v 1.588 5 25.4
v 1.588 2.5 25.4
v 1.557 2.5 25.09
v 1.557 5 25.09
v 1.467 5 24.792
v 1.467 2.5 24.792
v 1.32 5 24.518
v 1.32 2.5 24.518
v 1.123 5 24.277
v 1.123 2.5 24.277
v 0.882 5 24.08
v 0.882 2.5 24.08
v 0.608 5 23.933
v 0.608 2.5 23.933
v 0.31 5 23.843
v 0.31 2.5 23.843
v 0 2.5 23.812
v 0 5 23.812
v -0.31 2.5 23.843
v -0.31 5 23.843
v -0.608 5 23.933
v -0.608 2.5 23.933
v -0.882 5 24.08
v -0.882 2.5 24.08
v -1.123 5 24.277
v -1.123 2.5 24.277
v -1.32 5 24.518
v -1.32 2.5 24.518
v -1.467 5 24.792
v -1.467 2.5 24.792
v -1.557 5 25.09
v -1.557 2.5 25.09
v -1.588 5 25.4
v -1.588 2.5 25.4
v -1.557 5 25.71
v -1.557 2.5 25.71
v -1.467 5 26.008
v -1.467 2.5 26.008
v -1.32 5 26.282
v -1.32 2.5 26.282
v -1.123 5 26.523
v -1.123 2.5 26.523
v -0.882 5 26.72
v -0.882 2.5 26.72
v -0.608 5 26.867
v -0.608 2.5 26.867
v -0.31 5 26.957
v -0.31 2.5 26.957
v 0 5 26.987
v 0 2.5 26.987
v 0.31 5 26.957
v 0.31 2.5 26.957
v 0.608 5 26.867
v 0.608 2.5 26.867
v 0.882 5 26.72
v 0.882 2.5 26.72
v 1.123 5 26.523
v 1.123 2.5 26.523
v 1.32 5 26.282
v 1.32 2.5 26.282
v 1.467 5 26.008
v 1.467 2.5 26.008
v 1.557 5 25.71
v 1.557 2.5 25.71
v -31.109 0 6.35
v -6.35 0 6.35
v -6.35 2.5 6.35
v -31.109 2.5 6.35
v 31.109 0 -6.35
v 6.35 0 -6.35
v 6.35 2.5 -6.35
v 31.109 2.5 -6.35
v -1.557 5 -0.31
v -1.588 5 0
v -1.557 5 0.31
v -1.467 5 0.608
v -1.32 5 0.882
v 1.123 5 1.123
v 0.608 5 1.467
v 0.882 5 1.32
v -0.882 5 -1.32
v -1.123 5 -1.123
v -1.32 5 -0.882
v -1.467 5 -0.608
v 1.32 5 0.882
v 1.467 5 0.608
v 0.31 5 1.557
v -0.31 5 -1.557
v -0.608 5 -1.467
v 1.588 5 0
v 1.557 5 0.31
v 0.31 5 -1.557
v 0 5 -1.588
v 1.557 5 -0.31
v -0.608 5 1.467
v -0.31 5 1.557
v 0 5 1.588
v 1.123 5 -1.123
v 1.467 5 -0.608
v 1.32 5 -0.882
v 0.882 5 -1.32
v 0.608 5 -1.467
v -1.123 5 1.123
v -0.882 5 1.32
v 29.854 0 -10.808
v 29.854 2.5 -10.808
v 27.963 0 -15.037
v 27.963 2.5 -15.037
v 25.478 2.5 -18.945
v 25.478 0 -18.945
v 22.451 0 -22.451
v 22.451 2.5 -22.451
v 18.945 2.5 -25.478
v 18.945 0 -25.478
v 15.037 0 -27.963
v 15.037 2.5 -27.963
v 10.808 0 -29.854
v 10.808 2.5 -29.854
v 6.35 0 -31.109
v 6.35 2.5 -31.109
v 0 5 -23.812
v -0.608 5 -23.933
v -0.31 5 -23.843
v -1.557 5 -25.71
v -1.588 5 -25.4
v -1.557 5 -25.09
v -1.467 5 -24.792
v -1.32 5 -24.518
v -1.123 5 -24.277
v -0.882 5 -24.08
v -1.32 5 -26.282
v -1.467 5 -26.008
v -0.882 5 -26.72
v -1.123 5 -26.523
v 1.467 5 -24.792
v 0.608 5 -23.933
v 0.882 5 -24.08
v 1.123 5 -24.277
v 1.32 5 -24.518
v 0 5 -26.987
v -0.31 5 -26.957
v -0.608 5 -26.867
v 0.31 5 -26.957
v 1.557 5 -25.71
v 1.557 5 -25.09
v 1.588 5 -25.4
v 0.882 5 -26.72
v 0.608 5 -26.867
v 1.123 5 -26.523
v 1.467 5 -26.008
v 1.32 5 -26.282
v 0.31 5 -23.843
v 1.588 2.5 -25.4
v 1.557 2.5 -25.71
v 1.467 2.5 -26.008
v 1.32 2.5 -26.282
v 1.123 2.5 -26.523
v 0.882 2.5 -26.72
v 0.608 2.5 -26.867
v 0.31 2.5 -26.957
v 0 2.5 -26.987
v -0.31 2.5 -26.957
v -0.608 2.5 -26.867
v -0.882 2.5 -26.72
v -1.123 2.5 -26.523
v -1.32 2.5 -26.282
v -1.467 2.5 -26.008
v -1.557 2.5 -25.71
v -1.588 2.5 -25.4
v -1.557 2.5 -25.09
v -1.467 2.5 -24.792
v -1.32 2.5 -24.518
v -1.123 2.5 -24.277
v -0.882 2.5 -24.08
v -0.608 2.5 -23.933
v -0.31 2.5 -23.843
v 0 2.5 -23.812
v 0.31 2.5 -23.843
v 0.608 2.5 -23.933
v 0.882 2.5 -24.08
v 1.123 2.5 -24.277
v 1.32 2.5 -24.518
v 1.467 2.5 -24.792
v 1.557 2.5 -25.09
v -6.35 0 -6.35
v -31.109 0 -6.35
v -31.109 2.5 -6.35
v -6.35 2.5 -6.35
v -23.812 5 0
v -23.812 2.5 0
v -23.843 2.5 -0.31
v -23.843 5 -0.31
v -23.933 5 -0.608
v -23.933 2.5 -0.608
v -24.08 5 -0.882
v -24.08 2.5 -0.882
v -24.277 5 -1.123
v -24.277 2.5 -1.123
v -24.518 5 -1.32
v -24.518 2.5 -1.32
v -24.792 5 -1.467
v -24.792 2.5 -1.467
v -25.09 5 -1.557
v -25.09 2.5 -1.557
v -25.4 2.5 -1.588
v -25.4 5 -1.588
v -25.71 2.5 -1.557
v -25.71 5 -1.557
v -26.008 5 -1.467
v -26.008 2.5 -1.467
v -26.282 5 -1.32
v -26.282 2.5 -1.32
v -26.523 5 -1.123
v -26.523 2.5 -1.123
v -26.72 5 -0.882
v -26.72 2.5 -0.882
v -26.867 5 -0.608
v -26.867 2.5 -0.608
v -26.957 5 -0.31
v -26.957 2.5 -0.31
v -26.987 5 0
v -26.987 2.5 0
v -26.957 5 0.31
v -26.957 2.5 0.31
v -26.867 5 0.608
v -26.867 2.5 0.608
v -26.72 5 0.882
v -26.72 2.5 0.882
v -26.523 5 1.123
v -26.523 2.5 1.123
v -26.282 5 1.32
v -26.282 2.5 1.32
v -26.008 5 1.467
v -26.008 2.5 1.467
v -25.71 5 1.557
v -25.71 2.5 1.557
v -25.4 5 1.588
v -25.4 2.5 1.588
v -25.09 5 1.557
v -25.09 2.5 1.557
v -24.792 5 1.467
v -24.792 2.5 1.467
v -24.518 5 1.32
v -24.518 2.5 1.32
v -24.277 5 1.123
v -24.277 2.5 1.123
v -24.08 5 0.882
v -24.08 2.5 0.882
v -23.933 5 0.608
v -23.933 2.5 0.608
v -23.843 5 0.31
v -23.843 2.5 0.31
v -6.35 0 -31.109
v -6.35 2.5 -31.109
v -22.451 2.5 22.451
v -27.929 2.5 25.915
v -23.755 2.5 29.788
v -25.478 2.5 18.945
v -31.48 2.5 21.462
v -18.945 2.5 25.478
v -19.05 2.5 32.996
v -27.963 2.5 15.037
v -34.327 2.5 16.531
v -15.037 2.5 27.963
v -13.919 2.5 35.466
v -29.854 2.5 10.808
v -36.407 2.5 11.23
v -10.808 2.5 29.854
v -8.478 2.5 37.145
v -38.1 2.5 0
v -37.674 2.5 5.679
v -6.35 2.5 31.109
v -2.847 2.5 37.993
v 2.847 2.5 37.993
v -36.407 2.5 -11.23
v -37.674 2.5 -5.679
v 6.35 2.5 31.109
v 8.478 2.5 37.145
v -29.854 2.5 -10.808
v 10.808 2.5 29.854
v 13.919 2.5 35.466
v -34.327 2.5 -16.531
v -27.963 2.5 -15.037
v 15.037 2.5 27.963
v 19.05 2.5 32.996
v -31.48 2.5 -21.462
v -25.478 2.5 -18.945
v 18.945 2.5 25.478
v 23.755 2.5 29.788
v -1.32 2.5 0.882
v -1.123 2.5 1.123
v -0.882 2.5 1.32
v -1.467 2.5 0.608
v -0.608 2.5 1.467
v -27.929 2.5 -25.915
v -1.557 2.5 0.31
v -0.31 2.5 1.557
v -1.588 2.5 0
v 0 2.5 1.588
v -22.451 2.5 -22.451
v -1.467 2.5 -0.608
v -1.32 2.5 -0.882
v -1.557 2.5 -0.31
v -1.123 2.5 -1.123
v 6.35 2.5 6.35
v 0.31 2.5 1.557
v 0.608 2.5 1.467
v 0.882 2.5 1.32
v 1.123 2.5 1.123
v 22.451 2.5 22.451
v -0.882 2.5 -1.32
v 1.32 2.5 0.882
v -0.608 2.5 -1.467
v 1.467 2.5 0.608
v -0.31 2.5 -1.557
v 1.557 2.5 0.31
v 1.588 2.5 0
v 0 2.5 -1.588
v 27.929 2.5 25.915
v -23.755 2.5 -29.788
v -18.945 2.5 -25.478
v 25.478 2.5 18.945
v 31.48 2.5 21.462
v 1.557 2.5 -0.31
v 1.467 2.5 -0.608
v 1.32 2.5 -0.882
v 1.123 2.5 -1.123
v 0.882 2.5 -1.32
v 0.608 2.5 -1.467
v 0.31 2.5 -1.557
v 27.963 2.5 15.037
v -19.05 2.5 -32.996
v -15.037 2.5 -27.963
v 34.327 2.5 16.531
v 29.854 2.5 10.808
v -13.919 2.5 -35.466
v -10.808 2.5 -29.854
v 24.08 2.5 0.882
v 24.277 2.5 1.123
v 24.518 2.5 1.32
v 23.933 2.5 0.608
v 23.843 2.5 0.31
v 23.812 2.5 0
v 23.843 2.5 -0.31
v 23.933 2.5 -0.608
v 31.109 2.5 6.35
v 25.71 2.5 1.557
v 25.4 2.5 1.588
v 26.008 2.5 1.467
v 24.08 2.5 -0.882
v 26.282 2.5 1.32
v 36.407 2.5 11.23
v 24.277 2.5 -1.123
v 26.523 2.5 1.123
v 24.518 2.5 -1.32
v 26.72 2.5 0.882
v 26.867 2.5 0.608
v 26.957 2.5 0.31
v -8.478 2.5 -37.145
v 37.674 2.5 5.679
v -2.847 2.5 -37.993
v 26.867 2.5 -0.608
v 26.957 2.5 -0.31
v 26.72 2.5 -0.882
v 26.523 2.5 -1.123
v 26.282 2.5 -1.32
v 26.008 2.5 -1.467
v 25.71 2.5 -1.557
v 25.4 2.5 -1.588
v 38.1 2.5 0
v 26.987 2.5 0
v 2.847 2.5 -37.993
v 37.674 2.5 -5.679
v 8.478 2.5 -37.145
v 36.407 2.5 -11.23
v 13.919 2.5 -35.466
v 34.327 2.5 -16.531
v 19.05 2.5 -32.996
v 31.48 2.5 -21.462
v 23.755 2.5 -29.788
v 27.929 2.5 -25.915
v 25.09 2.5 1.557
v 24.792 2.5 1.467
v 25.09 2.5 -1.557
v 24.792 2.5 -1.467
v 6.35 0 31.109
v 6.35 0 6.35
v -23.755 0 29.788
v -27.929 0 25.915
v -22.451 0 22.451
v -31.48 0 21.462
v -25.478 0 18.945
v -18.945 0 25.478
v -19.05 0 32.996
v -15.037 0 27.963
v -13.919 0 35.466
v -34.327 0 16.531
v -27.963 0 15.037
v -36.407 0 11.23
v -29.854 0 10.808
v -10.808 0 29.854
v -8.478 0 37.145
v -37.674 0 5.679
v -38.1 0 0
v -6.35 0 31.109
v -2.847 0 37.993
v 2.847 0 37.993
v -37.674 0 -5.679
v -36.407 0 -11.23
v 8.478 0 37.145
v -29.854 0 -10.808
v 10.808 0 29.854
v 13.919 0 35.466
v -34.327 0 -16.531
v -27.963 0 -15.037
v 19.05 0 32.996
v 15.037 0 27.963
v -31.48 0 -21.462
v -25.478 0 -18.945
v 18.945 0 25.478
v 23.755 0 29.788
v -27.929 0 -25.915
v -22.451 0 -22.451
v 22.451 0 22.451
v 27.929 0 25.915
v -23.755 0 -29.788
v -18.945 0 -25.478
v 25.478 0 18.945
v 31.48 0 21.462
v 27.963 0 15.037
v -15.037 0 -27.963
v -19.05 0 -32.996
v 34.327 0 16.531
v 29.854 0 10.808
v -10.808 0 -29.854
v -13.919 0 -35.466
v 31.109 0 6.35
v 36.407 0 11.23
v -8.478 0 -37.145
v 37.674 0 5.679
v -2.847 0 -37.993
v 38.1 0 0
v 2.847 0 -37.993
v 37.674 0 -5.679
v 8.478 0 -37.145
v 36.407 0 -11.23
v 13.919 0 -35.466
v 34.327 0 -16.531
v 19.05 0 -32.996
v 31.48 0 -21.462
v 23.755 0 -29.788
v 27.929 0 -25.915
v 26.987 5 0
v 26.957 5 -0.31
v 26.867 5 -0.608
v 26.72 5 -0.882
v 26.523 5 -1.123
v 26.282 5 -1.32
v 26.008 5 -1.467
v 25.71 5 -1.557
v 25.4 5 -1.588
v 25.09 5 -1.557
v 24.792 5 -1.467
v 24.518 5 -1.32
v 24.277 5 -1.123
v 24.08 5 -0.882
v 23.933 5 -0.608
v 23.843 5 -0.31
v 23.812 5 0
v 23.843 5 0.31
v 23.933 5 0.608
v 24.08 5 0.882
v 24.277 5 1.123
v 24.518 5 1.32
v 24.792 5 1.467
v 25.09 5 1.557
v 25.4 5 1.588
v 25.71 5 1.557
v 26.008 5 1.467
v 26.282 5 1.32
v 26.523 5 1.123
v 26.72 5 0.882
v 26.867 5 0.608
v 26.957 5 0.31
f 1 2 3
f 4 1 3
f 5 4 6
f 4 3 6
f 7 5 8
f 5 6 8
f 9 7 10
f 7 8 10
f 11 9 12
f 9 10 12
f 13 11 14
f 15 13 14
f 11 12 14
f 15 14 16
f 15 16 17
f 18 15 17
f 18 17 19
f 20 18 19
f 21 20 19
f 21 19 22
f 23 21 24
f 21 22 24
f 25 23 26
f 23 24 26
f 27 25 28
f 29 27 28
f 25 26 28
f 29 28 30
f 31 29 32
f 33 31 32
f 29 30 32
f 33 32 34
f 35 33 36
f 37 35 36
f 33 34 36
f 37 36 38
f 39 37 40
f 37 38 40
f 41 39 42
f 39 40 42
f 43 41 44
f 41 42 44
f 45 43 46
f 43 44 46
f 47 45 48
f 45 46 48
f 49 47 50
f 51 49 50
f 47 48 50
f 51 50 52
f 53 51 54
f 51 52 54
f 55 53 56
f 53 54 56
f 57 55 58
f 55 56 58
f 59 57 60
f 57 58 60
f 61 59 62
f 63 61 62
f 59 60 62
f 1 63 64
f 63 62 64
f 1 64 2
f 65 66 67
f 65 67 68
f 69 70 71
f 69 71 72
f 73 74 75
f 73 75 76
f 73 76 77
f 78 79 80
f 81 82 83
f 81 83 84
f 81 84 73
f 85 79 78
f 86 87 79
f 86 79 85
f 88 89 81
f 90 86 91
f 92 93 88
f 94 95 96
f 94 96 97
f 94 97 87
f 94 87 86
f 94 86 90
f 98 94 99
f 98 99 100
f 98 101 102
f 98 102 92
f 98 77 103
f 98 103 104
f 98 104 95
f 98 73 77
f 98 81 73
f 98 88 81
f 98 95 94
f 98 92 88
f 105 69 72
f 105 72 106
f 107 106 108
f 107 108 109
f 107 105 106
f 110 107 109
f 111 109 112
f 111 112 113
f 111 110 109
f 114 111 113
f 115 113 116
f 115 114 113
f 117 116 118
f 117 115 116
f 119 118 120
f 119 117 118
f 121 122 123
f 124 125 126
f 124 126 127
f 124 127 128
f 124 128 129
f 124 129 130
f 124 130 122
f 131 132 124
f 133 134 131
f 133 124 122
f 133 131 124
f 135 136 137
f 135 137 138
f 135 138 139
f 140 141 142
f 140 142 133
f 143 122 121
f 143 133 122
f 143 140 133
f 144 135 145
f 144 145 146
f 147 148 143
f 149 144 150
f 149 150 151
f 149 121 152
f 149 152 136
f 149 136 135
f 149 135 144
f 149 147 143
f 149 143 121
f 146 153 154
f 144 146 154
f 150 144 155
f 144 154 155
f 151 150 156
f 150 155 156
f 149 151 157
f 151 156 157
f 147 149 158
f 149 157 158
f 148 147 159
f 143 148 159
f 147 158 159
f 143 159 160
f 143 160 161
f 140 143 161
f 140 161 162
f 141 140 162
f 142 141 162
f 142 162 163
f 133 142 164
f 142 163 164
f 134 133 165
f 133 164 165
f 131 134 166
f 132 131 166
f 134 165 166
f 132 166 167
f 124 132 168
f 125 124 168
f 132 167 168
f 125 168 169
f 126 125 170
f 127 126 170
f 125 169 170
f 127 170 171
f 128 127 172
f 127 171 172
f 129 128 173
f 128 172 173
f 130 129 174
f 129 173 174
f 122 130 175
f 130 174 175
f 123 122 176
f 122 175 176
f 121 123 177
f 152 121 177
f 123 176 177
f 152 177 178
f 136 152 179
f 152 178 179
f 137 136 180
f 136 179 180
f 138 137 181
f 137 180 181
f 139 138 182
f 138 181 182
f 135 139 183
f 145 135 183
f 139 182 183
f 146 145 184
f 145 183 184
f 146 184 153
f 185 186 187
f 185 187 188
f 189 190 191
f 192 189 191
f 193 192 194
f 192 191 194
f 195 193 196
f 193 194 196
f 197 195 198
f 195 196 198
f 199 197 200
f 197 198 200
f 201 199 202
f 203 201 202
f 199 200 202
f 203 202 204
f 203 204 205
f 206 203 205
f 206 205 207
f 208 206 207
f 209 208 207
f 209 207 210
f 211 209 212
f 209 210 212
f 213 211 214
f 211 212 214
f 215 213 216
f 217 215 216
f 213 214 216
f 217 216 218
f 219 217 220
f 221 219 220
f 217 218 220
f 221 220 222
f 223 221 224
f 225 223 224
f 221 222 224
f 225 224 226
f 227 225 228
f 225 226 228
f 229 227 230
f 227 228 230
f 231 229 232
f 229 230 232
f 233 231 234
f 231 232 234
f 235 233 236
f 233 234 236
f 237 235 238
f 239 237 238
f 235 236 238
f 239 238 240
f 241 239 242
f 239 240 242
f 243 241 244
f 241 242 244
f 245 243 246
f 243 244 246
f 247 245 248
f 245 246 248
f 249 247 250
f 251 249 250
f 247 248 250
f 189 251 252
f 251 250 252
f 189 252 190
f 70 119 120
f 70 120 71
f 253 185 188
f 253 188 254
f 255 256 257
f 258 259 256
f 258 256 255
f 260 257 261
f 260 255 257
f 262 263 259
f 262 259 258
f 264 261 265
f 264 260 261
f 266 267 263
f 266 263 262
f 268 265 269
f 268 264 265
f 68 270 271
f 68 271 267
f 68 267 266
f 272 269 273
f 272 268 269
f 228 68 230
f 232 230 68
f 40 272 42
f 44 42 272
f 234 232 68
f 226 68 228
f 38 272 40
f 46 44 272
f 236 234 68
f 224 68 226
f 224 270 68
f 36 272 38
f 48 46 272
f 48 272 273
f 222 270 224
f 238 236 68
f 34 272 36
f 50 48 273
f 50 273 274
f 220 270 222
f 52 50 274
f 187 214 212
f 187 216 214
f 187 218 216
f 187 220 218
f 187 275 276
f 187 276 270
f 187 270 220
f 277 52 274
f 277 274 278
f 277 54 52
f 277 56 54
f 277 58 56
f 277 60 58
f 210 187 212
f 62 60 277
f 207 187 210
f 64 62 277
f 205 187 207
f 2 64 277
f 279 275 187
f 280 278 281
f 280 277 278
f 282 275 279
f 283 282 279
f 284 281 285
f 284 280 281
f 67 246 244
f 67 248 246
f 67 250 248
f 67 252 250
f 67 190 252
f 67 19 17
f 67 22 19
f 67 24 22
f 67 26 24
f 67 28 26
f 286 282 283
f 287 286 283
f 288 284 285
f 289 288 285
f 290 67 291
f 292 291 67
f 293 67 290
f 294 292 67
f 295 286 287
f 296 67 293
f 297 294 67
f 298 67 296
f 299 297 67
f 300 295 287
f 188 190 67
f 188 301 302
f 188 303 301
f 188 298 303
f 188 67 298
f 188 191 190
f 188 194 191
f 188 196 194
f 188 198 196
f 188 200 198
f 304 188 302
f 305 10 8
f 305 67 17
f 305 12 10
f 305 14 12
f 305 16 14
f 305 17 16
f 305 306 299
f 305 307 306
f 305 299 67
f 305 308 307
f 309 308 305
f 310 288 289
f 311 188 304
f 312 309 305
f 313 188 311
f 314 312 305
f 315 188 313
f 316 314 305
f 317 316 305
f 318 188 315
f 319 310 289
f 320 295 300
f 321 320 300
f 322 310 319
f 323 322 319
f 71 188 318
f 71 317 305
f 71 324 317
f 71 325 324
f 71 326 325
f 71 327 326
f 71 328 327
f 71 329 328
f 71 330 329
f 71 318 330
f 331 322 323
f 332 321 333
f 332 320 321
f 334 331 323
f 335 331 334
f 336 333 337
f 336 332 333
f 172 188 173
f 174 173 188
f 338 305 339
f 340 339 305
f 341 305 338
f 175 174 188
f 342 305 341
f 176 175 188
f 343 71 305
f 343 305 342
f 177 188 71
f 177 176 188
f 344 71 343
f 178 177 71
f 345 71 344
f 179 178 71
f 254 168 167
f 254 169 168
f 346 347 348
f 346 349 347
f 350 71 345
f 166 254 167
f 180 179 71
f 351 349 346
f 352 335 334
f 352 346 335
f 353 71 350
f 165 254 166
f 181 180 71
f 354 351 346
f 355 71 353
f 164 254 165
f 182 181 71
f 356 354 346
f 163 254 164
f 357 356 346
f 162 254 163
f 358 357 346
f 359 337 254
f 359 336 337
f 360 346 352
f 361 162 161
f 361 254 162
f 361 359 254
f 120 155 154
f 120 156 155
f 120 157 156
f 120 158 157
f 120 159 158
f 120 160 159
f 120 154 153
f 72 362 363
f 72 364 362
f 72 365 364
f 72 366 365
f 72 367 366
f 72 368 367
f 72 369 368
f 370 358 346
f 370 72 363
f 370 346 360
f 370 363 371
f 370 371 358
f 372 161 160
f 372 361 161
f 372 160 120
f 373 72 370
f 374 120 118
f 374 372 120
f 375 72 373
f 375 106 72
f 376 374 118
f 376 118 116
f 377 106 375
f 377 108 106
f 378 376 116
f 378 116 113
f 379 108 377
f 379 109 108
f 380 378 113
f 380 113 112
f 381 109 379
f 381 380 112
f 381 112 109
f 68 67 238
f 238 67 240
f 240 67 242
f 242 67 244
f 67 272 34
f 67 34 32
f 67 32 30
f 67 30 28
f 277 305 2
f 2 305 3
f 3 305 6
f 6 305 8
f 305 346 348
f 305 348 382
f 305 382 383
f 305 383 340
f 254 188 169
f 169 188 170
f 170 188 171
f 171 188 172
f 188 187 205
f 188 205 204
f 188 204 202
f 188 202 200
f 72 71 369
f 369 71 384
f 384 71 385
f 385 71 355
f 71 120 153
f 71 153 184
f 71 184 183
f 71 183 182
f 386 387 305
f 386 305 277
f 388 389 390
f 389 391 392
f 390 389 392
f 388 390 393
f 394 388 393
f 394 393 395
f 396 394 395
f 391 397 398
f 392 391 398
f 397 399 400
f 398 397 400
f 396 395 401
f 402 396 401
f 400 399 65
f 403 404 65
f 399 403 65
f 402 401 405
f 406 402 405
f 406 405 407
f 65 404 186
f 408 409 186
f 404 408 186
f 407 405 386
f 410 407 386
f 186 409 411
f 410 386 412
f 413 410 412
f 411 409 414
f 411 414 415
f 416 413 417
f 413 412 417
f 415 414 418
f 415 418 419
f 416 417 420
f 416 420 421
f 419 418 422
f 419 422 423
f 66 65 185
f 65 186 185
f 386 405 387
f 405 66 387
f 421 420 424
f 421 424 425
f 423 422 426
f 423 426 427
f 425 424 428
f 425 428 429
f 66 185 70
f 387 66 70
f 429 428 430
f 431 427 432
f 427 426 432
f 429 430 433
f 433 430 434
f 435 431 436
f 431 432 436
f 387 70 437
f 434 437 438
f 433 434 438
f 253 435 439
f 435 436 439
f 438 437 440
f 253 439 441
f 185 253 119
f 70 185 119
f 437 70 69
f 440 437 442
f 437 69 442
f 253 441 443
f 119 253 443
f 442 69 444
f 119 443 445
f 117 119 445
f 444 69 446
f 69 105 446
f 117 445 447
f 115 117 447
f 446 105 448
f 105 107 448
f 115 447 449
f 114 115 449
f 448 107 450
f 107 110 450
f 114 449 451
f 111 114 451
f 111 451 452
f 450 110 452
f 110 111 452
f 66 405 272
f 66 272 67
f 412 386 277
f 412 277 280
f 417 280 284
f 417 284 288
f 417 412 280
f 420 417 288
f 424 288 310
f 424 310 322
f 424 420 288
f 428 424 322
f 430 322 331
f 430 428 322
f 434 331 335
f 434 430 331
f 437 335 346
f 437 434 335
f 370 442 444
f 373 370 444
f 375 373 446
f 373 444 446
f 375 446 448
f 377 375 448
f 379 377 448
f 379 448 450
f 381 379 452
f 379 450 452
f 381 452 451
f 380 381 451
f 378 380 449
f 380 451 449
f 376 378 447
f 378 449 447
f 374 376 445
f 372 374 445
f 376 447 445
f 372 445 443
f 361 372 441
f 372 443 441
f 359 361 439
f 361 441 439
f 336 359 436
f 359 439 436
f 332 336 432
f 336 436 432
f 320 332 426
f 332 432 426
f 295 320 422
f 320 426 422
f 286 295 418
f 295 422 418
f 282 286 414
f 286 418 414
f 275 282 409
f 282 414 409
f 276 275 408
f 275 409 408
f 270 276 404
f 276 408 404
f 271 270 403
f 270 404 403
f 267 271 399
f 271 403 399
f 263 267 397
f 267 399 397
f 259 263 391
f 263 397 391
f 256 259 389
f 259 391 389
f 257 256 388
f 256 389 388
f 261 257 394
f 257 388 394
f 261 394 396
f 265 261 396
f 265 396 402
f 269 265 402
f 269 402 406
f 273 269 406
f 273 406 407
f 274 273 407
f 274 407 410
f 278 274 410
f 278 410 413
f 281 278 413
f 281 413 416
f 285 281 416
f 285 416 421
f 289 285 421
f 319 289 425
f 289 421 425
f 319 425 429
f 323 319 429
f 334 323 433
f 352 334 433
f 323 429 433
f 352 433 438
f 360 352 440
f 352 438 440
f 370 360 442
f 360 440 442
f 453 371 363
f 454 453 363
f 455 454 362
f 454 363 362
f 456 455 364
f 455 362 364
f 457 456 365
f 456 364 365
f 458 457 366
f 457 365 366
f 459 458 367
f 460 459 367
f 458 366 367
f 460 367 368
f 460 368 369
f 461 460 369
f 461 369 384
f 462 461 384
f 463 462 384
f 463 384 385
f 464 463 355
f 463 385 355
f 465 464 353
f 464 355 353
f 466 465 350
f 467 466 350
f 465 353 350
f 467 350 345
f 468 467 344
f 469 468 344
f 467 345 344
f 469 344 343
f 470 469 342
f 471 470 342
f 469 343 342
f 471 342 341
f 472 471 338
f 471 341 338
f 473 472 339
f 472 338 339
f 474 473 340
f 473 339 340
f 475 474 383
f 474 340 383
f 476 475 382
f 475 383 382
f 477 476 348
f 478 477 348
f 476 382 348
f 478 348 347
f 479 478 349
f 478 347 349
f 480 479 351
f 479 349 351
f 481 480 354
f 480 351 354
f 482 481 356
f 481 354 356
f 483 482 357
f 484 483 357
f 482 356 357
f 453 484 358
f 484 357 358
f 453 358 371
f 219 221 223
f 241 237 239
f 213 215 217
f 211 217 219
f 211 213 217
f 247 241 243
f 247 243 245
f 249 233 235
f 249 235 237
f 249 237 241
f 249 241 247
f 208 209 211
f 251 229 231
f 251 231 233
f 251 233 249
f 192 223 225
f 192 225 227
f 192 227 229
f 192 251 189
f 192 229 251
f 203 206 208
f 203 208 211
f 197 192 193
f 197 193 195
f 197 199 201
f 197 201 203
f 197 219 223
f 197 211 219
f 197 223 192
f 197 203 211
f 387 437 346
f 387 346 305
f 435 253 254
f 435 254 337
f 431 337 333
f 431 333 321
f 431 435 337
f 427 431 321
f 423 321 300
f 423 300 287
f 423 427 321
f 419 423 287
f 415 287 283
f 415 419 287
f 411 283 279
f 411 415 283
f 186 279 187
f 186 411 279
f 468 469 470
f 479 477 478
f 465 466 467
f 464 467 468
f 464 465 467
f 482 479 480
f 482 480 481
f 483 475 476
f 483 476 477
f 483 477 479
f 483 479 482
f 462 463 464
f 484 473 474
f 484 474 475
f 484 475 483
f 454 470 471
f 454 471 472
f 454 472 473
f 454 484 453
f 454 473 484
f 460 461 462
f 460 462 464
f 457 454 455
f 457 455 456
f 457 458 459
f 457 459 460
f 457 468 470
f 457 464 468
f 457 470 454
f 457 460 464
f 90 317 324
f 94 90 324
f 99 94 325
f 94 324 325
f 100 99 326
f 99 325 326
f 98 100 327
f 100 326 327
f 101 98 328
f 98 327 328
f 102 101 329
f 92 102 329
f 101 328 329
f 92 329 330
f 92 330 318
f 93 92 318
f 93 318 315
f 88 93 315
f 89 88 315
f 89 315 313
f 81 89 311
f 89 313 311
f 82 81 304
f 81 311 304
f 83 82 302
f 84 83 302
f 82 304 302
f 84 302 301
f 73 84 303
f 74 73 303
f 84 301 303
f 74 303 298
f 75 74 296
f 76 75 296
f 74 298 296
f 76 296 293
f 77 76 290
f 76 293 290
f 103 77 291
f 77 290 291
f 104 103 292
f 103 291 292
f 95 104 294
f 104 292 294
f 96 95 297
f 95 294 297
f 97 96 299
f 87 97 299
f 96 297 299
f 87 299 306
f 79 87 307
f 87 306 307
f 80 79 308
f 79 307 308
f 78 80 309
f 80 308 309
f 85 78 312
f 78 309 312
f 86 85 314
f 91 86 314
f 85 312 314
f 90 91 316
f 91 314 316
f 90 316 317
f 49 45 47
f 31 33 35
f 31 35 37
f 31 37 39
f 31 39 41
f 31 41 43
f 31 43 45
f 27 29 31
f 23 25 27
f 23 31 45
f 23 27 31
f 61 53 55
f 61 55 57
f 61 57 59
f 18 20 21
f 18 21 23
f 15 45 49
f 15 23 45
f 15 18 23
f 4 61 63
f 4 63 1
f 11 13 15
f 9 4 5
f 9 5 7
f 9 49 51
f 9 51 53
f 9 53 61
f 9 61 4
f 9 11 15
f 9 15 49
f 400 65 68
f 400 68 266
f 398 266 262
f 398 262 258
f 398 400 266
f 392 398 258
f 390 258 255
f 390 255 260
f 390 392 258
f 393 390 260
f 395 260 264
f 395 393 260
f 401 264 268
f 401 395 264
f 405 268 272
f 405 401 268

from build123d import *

# Parameters (mm, degrees)
SKETCH1_R           = 38.1
BOSS_EXTRUDE1_DEPTH = 2.5
SKETCH2_R           = 1.5875
BOSS_EXTRUDE2_DEPTH = 2.5


with BuildPart() as part:
    # Sketch1 → Boss-Extrude1 (new body)
    with BuildSketch(Plane(origin=(0, 0, 0), x_dir=(1, 0, 0), z_dir=(0, 1, 0))):
        Circle(SKETCH1_R)
        with BuildLine():
            ThreePointArc((6.35, -31.108519733), (22.450640303, -22.450640303), (31.108519733, -6.35))
            Line((31.108519733, -6.35), (6.35, -6.35))
            Line((6.35, -6.35), (6.35, -31.108519733))
        make_face(mode=Mode.SUBTRACT)
        with BuildLine():
            ThreePointArc((-31.108519733, -6.35), (-22.450640303, -22.450640303), (-6.35, -31.108519733))
            Line((-6.35, -31.108519733), (-6.35, -6.35))
            Line((-6.35, -6.35), (-31.108519733, -6.35))
        make_face(mode=Mode.SUBTRACT)
        with BuildLine():
            ThreePointArc((-6.35, 31.108519733), (-22.450640303, 22.450640303), (-31.108519733, 6.35))
            Line((-31.108519733, 6.35), (-6.35, 6.35))
            Line((-6.35, 6.35), (-6.35, 31.108519733))
        make_face(mode=Mode.SUBTRACT)
        with BuildLine():
            ThreePointArc((31.108519733, 6.35), (22.450640303, 22.450640303), (6.35, 31.108519733))
            Line((6.35, 31.108519733), (6.35, 6.35))
            Line((6.35, 6.35), (31.108519733, 6.35))
        make_face(mode=Mode.SUBTRACT)
    extrude(amount=BOSS_EXTRUDE1_DEPTH)

    # Sketch2 → Boss-Extrude2 (add)
    with BuildSketch(Plane(origin=(0, 2.5, 0), x_dir=(1, 0, 0), z_dir=(0, 1, 0))):
        Circle(SKETCH2_R)
        with Locations((-25.4, 0)):
            Circle(SKETCH2_R)
        with Locations((0, 25.4)):
            Circle(SKETCH2_R)
        with Locations((25.4, 0)):
            Circle(SKETCH2_R)
        with Locations((0, -25.4)):
            Circle(SKETCH2_R)
    extrude(amount=BOSS_EXTRUDE2_DEPTH)


solid = part.part
